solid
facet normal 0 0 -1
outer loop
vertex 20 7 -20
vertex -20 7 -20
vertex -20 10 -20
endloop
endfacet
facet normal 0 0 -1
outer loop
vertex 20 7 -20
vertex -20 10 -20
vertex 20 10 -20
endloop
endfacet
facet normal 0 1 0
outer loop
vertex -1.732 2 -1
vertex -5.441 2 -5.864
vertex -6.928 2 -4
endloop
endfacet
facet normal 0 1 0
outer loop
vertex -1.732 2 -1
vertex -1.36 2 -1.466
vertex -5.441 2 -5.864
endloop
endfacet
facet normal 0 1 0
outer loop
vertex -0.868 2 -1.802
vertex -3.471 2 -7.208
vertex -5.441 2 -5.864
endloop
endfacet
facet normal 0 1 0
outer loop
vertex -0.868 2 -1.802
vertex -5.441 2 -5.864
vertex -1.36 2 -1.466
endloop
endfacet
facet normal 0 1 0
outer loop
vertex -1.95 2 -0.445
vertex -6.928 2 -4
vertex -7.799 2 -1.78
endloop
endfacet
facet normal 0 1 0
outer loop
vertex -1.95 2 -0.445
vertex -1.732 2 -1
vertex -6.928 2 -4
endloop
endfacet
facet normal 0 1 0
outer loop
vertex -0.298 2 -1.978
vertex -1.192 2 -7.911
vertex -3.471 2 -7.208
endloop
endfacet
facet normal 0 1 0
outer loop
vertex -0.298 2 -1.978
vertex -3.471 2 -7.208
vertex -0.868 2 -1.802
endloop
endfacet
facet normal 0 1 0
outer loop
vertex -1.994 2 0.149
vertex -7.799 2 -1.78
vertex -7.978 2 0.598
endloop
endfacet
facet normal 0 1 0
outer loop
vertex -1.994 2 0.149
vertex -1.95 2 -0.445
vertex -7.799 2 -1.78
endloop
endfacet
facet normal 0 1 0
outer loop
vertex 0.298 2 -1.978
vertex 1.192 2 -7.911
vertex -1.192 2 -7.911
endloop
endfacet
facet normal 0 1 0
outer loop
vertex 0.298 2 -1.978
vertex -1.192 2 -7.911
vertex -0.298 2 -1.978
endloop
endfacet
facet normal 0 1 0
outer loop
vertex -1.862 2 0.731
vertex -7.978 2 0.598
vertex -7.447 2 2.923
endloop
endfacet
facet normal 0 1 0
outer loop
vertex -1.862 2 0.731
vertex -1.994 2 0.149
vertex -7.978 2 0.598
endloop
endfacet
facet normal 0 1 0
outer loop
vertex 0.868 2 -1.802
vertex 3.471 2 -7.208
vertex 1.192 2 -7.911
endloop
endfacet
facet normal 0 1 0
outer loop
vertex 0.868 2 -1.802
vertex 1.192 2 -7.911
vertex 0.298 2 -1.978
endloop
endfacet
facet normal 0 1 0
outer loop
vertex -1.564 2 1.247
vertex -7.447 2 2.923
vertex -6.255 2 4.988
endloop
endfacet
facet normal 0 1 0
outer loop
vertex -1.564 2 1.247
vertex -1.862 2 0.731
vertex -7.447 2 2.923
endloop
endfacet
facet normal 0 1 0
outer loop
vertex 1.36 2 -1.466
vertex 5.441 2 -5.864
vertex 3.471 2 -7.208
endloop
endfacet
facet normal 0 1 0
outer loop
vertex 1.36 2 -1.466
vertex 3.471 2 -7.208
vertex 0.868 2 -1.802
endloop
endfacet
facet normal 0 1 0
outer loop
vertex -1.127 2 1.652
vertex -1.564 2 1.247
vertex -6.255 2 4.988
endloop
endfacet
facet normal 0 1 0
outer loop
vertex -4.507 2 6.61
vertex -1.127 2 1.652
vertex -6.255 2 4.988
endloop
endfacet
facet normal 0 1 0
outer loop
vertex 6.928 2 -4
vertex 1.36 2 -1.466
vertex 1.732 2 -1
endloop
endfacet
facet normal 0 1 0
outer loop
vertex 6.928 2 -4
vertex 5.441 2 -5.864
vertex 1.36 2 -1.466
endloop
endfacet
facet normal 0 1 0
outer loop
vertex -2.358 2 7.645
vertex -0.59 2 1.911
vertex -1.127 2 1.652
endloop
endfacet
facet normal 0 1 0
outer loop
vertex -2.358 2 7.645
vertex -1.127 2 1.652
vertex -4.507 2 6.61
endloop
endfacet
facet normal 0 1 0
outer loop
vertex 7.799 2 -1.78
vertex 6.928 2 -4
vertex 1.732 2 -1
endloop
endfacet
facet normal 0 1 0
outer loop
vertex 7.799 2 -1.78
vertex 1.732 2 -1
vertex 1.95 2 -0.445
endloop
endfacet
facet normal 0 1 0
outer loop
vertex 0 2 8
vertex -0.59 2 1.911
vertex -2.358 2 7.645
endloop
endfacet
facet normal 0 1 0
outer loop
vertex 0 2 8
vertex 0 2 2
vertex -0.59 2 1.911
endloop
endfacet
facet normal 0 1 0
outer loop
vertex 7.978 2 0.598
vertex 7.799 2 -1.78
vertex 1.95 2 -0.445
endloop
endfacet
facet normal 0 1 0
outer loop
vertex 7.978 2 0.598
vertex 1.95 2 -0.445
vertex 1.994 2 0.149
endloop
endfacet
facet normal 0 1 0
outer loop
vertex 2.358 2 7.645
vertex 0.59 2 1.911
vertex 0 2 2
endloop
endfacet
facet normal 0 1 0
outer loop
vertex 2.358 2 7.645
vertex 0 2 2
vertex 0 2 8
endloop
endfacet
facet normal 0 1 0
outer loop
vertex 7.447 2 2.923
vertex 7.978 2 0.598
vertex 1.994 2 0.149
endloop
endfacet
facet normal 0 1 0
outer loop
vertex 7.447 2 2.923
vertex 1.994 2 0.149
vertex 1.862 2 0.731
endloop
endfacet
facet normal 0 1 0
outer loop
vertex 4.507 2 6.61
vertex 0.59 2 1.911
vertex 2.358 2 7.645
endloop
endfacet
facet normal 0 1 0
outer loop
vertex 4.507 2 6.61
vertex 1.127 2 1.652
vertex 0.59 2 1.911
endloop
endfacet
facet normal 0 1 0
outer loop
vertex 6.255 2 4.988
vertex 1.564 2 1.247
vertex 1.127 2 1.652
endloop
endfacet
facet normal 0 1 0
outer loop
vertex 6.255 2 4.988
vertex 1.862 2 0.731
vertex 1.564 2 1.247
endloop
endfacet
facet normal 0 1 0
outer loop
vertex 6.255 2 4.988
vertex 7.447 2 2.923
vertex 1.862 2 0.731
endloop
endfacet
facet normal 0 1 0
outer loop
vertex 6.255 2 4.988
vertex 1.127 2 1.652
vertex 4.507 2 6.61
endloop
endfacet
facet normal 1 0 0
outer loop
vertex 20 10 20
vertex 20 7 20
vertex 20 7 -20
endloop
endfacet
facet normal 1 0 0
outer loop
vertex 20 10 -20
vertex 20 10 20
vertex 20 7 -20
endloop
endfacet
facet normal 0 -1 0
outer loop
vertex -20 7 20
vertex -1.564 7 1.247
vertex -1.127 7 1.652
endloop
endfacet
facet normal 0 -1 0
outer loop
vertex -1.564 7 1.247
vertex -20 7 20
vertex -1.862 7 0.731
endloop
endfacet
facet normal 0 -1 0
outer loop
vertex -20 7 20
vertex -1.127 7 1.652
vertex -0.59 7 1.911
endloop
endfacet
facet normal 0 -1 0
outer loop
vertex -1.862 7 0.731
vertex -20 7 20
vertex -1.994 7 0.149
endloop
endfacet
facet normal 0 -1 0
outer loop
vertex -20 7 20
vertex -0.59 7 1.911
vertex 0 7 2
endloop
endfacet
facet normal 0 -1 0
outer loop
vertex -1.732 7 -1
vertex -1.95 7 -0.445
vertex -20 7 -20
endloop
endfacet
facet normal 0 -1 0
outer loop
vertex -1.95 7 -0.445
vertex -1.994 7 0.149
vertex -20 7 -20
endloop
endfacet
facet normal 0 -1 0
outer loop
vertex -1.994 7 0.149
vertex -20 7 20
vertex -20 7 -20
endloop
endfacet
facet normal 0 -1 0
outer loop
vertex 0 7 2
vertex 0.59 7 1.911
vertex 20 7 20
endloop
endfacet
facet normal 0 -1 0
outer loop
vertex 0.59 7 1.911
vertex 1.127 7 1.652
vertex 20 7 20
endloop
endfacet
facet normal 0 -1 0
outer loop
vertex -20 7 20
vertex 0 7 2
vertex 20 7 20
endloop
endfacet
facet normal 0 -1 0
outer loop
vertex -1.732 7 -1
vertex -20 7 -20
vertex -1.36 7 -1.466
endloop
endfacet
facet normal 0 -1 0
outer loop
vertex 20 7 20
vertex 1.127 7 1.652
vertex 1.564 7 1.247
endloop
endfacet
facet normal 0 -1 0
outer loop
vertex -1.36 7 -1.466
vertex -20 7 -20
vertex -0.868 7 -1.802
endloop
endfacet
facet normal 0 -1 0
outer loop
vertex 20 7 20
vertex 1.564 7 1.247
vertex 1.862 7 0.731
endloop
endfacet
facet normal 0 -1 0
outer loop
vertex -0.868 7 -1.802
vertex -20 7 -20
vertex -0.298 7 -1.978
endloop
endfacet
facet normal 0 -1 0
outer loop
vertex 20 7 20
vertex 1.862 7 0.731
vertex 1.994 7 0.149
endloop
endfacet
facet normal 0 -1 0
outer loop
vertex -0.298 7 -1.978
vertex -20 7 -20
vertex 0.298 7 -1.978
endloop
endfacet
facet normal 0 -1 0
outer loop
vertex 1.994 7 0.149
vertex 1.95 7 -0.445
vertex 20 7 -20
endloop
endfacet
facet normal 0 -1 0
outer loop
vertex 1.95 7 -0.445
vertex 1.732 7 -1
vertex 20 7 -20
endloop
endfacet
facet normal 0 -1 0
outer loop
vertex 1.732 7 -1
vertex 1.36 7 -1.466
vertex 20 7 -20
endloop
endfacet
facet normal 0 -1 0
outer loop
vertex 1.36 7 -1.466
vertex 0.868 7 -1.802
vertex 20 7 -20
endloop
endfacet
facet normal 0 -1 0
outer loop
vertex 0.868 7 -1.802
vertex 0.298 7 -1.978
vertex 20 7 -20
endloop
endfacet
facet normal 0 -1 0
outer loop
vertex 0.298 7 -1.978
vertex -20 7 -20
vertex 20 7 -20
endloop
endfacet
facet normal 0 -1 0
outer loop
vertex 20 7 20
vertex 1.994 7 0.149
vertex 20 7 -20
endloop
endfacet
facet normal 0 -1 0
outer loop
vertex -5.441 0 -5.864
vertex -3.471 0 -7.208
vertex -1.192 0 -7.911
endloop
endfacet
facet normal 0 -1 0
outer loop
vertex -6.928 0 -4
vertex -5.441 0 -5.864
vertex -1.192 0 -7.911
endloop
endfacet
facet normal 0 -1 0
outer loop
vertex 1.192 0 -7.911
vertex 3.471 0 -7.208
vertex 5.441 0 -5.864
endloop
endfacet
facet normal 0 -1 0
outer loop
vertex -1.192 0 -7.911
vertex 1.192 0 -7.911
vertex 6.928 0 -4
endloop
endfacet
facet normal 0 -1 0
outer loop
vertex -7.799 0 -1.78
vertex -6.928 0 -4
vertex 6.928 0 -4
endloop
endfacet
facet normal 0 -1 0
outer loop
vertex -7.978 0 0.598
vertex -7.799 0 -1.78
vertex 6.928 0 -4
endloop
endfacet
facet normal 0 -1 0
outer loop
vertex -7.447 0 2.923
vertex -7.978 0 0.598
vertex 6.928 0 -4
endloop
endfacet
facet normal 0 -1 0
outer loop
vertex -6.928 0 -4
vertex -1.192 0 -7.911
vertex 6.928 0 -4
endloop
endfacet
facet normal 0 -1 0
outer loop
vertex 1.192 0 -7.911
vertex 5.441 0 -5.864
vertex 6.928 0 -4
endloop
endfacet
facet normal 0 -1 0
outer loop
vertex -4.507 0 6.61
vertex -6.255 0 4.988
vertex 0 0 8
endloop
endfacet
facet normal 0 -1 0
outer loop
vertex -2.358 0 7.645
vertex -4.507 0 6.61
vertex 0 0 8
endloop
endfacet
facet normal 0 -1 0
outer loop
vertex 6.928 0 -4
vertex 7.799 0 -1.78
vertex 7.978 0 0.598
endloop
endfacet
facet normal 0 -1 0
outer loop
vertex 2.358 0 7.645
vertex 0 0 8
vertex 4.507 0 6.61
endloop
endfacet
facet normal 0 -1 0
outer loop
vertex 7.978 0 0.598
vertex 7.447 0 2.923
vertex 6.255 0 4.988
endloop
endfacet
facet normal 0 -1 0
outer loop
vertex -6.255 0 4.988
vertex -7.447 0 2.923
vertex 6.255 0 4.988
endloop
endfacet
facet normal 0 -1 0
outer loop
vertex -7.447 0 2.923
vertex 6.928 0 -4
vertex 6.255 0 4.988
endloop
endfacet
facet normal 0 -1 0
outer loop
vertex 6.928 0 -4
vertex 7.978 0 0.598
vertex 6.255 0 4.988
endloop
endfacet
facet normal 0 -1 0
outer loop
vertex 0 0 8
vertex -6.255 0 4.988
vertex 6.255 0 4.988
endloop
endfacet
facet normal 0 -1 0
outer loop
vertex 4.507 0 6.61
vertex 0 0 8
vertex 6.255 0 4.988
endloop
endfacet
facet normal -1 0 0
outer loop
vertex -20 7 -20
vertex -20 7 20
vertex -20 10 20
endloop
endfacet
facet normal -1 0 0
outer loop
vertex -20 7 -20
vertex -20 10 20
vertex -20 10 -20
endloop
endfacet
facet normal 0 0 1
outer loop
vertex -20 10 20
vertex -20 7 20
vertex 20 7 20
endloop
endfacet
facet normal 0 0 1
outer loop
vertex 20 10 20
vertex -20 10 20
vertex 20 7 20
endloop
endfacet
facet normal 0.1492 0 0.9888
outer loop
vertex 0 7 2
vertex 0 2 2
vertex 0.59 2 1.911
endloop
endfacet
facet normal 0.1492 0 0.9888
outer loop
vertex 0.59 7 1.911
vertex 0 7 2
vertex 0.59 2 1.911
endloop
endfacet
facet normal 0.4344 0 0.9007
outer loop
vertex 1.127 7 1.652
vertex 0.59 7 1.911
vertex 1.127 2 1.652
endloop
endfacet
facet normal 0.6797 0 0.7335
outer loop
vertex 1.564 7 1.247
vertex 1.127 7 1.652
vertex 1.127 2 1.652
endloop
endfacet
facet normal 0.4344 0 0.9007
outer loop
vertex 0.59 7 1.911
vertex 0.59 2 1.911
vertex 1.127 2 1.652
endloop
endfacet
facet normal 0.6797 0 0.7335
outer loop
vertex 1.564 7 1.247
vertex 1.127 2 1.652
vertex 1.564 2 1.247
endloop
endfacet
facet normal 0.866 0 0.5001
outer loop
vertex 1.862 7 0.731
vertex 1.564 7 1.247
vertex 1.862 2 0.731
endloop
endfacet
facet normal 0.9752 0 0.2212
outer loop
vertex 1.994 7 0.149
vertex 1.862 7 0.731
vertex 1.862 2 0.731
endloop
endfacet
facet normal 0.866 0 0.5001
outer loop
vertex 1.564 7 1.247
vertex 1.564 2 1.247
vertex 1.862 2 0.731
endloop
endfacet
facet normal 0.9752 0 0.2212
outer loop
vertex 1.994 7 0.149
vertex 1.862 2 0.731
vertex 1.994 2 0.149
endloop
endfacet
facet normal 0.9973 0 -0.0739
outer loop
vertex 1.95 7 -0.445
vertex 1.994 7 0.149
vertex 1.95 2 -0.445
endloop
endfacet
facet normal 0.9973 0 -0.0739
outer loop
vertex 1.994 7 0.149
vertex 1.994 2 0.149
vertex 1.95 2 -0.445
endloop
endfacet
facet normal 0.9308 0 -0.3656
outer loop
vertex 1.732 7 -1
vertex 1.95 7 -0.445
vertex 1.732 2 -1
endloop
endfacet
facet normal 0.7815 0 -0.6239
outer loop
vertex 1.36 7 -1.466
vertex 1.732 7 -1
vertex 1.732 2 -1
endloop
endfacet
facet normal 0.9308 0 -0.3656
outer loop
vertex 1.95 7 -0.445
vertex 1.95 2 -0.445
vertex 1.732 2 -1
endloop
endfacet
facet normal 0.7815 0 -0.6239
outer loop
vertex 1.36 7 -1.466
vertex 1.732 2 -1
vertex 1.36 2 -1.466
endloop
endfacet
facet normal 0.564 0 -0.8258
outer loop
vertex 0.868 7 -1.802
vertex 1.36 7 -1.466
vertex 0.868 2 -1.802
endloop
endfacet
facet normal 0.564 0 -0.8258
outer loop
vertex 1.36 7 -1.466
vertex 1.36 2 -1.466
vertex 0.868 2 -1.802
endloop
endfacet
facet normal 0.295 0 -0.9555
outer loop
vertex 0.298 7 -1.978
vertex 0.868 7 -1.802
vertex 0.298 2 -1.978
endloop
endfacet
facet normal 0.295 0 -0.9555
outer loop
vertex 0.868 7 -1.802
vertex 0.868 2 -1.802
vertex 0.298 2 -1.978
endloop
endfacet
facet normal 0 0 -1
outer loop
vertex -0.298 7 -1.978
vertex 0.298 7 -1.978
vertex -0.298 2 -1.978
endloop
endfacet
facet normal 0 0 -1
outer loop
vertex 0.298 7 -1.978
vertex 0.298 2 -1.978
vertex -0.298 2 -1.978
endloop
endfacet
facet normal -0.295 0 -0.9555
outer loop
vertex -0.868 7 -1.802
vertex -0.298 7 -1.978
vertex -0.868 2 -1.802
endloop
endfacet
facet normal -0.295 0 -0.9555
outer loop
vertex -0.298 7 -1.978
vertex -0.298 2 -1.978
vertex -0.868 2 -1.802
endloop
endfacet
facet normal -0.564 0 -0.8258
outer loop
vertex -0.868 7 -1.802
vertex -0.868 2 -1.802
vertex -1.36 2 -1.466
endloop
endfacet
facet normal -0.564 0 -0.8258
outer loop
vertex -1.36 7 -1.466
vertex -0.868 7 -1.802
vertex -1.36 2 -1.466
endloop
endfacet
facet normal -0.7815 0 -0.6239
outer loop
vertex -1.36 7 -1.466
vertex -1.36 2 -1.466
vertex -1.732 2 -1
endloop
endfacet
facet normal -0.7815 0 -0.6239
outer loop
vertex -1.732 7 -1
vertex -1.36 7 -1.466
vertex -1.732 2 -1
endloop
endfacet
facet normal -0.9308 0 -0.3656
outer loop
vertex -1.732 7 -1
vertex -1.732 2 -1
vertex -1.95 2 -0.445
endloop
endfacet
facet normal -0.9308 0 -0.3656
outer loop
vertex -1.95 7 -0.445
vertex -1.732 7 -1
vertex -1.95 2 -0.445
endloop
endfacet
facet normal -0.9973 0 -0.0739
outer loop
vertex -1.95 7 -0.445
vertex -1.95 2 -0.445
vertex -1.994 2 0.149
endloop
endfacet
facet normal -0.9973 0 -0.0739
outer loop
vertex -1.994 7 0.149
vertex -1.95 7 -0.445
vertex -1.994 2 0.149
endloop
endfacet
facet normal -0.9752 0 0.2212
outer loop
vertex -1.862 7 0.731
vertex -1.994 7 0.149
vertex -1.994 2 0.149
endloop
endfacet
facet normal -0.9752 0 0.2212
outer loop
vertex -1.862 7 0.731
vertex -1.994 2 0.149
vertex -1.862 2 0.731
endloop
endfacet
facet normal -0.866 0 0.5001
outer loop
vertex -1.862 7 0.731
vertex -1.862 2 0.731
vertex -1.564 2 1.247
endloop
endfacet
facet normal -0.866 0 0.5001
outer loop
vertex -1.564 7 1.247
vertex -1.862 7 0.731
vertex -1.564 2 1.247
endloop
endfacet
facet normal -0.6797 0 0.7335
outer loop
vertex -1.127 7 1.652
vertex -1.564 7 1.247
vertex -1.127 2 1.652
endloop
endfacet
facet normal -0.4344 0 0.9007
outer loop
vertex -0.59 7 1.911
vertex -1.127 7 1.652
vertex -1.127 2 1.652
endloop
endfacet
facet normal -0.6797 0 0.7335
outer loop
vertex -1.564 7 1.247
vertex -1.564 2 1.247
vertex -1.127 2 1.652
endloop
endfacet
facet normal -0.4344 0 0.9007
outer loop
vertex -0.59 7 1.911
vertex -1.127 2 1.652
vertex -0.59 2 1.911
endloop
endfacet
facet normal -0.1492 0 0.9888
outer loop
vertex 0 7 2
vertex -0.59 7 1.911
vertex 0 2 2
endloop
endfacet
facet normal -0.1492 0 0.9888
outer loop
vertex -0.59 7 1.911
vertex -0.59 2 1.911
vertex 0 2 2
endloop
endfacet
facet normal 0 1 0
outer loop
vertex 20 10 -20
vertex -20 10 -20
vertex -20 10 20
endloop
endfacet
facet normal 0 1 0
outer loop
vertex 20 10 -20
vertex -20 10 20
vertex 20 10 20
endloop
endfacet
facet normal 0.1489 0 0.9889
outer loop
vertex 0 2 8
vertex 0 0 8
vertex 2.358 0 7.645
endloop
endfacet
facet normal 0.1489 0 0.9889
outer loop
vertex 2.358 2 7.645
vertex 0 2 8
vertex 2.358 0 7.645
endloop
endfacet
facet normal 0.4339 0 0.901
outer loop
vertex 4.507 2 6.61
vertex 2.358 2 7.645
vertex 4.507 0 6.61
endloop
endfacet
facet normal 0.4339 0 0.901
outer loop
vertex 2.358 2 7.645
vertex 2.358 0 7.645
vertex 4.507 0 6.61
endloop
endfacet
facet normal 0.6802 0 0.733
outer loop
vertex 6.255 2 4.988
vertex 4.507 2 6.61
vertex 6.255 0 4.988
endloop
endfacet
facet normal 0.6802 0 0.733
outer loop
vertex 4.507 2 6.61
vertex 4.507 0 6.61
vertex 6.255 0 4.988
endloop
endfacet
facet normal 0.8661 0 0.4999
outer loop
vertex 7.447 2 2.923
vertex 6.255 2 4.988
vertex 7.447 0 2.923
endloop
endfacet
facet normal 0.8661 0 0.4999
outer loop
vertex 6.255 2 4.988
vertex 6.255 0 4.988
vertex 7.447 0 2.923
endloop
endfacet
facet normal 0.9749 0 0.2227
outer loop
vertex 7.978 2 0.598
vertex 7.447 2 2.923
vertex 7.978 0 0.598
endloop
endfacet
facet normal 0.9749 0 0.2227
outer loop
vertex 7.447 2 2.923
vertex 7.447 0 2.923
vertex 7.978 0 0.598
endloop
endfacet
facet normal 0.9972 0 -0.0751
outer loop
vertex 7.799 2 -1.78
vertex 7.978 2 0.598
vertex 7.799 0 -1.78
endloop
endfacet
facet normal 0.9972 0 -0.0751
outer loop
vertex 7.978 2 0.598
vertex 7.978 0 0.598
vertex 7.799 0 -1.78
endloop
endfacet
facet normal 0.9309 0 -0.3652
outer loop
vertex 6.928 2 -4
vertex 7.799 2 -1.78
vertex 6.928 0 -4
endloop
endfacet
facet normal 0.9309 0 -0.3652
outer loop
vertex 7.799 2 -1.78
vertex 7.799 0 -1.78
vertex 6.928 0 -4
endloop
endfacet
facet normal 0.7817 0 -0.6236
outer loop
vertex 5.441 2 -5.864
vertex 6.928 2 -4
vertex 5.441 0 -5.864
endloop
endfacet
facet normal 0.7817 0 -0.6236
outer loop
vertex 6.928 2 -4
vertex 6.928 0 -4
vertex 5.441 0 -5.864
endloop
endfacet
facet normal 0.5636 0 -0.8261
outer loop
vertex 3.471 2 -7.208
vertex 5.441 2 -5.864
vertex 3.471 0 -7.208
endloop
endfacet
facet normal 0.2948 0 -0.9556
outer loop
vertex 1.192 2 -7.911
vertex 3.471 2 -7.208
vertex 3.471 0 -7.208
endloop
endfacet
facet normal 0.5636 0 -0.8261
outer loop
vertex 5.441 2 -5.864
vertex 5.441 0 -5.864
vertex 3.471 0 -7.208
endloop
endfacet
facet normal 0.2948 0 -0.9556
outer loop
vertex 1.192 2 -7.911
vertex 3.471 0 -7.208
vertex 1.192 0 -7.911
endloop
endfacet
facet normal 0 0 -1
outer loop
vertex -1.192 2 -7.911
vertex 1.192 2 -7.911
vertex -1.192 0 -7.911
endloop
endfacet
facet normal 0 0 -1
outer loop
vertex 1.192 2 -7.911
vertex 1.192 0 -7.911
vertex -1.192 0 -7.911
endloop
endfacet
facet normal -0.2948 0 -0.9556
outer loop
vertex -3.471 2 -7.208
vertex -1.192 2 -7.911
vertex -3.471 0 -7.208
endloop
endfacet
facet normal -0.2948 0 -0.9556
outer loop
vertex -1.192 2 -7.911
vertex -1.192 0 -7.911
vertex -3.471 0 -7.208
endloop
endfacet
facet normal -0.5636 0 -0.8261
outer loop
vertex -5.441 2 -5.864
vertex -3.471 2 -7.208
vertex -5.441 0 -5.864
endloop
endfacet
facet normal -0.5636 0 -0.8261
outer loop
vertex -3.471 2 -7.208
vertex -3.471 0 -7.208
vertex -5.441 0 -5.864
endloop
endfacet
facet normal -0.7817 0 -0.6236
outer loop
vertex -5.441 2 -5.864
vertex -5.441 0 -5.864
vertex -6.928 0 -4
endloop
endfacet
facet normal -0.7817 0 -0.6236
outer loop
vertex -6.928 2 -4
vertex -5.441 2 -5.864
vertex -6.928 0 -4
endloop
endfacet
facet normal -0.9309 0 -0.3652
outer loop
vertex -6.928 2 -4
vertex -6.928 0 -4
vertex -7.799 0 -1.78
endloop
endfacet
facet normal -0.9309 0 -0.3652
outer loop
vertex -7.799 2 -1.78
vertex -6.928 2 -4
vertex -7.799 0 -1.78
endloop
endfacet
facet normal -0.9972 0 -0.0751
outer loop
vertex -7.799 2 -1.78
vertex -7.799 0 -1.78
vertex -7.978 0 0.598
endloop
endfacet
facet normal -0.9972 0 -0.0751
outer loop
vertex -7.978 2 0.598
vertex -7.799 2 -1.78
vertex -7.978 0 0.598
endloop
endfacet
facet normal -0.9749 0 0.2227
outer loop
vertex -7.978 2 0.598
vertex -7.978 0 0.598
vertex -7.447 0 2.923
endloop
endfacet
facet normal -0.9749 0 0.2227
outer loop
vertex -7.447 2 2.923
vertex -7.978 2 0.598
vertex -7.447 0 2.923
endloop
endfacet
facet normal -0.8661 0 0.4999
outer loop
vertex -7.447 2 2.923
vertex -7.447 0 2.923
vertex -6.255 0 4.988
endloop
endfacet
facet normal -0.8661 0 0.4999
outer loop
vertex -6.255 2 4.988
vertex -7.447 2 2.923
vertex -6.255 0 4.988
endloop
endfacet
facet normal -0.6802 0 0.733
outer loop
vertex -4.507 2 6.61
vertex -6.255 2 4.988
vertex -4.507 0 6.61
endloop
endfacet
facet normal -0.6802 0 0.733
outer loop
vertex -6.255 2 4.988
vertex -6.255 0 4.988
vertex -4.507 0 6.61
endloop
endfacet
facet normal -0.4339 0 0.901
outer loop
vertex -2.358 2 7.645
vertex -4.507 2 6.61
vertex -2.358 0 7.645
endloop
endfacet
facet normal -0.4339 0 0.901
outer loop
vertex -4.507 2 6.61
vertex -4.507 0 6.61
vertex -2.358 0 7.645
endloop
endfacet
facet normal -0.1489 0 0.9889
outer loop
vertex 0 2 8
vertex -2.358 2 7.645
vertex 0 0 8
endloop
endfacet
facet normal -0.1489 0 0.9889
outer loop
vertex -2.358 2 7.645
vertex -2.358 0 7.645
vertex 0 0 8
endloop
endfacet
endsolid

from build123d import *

# Parameters (mm, degrees)
SKETCH_1_R      = 8
EXTRUDE_1_DEPTH = 2
SKETCH_2_R      = 2
EXTRUDE_2_DEPTH = 5
SKETCH_3_W      = 40
SKETCH_3_H      = 40
EXTRUDE_3_DEPTH = 3


with BuildPart() as part:
    # 草图1 → 凸台-拉伸1 (new body)
    with BuildSketch(Plane(origin=(0, 0, 0), x_dir=(1, 0, 0), z_dir=(0, 1, 0))):
        with Locations(Location((0, 0, 0), (0, 0, 270))):
            Circle(SKETCH_1_R)
    extrude(amount=EXTRUDE_1_DEPTH)

    # 草图2 → 凸台-拉伸2 (add)
    with BuildSketch(Plane(origin=(0, 2, 0), x_dir=(1, 0, 0), z_dir=(0, 1, 0))):
        with Locations(Location((0, 0, 0), (0, 0, 270))):
            Circle(SKETCH_2_R)
    extrude(amount=EXTRUDE_2_DEPTH)

    # 草图3 → 凸台-拉伸3 (add)
    with BuildSketch(Plane(origin=(0, 7, 0), x_dir=(1, 0, 0), z_dir=(0, 1, 0))):
        Rectangle(SKETCH_3_W, SKETCH_3_H)
    extrude(amount=EXTRUDE_3_DEPTH)


solid = part.part
